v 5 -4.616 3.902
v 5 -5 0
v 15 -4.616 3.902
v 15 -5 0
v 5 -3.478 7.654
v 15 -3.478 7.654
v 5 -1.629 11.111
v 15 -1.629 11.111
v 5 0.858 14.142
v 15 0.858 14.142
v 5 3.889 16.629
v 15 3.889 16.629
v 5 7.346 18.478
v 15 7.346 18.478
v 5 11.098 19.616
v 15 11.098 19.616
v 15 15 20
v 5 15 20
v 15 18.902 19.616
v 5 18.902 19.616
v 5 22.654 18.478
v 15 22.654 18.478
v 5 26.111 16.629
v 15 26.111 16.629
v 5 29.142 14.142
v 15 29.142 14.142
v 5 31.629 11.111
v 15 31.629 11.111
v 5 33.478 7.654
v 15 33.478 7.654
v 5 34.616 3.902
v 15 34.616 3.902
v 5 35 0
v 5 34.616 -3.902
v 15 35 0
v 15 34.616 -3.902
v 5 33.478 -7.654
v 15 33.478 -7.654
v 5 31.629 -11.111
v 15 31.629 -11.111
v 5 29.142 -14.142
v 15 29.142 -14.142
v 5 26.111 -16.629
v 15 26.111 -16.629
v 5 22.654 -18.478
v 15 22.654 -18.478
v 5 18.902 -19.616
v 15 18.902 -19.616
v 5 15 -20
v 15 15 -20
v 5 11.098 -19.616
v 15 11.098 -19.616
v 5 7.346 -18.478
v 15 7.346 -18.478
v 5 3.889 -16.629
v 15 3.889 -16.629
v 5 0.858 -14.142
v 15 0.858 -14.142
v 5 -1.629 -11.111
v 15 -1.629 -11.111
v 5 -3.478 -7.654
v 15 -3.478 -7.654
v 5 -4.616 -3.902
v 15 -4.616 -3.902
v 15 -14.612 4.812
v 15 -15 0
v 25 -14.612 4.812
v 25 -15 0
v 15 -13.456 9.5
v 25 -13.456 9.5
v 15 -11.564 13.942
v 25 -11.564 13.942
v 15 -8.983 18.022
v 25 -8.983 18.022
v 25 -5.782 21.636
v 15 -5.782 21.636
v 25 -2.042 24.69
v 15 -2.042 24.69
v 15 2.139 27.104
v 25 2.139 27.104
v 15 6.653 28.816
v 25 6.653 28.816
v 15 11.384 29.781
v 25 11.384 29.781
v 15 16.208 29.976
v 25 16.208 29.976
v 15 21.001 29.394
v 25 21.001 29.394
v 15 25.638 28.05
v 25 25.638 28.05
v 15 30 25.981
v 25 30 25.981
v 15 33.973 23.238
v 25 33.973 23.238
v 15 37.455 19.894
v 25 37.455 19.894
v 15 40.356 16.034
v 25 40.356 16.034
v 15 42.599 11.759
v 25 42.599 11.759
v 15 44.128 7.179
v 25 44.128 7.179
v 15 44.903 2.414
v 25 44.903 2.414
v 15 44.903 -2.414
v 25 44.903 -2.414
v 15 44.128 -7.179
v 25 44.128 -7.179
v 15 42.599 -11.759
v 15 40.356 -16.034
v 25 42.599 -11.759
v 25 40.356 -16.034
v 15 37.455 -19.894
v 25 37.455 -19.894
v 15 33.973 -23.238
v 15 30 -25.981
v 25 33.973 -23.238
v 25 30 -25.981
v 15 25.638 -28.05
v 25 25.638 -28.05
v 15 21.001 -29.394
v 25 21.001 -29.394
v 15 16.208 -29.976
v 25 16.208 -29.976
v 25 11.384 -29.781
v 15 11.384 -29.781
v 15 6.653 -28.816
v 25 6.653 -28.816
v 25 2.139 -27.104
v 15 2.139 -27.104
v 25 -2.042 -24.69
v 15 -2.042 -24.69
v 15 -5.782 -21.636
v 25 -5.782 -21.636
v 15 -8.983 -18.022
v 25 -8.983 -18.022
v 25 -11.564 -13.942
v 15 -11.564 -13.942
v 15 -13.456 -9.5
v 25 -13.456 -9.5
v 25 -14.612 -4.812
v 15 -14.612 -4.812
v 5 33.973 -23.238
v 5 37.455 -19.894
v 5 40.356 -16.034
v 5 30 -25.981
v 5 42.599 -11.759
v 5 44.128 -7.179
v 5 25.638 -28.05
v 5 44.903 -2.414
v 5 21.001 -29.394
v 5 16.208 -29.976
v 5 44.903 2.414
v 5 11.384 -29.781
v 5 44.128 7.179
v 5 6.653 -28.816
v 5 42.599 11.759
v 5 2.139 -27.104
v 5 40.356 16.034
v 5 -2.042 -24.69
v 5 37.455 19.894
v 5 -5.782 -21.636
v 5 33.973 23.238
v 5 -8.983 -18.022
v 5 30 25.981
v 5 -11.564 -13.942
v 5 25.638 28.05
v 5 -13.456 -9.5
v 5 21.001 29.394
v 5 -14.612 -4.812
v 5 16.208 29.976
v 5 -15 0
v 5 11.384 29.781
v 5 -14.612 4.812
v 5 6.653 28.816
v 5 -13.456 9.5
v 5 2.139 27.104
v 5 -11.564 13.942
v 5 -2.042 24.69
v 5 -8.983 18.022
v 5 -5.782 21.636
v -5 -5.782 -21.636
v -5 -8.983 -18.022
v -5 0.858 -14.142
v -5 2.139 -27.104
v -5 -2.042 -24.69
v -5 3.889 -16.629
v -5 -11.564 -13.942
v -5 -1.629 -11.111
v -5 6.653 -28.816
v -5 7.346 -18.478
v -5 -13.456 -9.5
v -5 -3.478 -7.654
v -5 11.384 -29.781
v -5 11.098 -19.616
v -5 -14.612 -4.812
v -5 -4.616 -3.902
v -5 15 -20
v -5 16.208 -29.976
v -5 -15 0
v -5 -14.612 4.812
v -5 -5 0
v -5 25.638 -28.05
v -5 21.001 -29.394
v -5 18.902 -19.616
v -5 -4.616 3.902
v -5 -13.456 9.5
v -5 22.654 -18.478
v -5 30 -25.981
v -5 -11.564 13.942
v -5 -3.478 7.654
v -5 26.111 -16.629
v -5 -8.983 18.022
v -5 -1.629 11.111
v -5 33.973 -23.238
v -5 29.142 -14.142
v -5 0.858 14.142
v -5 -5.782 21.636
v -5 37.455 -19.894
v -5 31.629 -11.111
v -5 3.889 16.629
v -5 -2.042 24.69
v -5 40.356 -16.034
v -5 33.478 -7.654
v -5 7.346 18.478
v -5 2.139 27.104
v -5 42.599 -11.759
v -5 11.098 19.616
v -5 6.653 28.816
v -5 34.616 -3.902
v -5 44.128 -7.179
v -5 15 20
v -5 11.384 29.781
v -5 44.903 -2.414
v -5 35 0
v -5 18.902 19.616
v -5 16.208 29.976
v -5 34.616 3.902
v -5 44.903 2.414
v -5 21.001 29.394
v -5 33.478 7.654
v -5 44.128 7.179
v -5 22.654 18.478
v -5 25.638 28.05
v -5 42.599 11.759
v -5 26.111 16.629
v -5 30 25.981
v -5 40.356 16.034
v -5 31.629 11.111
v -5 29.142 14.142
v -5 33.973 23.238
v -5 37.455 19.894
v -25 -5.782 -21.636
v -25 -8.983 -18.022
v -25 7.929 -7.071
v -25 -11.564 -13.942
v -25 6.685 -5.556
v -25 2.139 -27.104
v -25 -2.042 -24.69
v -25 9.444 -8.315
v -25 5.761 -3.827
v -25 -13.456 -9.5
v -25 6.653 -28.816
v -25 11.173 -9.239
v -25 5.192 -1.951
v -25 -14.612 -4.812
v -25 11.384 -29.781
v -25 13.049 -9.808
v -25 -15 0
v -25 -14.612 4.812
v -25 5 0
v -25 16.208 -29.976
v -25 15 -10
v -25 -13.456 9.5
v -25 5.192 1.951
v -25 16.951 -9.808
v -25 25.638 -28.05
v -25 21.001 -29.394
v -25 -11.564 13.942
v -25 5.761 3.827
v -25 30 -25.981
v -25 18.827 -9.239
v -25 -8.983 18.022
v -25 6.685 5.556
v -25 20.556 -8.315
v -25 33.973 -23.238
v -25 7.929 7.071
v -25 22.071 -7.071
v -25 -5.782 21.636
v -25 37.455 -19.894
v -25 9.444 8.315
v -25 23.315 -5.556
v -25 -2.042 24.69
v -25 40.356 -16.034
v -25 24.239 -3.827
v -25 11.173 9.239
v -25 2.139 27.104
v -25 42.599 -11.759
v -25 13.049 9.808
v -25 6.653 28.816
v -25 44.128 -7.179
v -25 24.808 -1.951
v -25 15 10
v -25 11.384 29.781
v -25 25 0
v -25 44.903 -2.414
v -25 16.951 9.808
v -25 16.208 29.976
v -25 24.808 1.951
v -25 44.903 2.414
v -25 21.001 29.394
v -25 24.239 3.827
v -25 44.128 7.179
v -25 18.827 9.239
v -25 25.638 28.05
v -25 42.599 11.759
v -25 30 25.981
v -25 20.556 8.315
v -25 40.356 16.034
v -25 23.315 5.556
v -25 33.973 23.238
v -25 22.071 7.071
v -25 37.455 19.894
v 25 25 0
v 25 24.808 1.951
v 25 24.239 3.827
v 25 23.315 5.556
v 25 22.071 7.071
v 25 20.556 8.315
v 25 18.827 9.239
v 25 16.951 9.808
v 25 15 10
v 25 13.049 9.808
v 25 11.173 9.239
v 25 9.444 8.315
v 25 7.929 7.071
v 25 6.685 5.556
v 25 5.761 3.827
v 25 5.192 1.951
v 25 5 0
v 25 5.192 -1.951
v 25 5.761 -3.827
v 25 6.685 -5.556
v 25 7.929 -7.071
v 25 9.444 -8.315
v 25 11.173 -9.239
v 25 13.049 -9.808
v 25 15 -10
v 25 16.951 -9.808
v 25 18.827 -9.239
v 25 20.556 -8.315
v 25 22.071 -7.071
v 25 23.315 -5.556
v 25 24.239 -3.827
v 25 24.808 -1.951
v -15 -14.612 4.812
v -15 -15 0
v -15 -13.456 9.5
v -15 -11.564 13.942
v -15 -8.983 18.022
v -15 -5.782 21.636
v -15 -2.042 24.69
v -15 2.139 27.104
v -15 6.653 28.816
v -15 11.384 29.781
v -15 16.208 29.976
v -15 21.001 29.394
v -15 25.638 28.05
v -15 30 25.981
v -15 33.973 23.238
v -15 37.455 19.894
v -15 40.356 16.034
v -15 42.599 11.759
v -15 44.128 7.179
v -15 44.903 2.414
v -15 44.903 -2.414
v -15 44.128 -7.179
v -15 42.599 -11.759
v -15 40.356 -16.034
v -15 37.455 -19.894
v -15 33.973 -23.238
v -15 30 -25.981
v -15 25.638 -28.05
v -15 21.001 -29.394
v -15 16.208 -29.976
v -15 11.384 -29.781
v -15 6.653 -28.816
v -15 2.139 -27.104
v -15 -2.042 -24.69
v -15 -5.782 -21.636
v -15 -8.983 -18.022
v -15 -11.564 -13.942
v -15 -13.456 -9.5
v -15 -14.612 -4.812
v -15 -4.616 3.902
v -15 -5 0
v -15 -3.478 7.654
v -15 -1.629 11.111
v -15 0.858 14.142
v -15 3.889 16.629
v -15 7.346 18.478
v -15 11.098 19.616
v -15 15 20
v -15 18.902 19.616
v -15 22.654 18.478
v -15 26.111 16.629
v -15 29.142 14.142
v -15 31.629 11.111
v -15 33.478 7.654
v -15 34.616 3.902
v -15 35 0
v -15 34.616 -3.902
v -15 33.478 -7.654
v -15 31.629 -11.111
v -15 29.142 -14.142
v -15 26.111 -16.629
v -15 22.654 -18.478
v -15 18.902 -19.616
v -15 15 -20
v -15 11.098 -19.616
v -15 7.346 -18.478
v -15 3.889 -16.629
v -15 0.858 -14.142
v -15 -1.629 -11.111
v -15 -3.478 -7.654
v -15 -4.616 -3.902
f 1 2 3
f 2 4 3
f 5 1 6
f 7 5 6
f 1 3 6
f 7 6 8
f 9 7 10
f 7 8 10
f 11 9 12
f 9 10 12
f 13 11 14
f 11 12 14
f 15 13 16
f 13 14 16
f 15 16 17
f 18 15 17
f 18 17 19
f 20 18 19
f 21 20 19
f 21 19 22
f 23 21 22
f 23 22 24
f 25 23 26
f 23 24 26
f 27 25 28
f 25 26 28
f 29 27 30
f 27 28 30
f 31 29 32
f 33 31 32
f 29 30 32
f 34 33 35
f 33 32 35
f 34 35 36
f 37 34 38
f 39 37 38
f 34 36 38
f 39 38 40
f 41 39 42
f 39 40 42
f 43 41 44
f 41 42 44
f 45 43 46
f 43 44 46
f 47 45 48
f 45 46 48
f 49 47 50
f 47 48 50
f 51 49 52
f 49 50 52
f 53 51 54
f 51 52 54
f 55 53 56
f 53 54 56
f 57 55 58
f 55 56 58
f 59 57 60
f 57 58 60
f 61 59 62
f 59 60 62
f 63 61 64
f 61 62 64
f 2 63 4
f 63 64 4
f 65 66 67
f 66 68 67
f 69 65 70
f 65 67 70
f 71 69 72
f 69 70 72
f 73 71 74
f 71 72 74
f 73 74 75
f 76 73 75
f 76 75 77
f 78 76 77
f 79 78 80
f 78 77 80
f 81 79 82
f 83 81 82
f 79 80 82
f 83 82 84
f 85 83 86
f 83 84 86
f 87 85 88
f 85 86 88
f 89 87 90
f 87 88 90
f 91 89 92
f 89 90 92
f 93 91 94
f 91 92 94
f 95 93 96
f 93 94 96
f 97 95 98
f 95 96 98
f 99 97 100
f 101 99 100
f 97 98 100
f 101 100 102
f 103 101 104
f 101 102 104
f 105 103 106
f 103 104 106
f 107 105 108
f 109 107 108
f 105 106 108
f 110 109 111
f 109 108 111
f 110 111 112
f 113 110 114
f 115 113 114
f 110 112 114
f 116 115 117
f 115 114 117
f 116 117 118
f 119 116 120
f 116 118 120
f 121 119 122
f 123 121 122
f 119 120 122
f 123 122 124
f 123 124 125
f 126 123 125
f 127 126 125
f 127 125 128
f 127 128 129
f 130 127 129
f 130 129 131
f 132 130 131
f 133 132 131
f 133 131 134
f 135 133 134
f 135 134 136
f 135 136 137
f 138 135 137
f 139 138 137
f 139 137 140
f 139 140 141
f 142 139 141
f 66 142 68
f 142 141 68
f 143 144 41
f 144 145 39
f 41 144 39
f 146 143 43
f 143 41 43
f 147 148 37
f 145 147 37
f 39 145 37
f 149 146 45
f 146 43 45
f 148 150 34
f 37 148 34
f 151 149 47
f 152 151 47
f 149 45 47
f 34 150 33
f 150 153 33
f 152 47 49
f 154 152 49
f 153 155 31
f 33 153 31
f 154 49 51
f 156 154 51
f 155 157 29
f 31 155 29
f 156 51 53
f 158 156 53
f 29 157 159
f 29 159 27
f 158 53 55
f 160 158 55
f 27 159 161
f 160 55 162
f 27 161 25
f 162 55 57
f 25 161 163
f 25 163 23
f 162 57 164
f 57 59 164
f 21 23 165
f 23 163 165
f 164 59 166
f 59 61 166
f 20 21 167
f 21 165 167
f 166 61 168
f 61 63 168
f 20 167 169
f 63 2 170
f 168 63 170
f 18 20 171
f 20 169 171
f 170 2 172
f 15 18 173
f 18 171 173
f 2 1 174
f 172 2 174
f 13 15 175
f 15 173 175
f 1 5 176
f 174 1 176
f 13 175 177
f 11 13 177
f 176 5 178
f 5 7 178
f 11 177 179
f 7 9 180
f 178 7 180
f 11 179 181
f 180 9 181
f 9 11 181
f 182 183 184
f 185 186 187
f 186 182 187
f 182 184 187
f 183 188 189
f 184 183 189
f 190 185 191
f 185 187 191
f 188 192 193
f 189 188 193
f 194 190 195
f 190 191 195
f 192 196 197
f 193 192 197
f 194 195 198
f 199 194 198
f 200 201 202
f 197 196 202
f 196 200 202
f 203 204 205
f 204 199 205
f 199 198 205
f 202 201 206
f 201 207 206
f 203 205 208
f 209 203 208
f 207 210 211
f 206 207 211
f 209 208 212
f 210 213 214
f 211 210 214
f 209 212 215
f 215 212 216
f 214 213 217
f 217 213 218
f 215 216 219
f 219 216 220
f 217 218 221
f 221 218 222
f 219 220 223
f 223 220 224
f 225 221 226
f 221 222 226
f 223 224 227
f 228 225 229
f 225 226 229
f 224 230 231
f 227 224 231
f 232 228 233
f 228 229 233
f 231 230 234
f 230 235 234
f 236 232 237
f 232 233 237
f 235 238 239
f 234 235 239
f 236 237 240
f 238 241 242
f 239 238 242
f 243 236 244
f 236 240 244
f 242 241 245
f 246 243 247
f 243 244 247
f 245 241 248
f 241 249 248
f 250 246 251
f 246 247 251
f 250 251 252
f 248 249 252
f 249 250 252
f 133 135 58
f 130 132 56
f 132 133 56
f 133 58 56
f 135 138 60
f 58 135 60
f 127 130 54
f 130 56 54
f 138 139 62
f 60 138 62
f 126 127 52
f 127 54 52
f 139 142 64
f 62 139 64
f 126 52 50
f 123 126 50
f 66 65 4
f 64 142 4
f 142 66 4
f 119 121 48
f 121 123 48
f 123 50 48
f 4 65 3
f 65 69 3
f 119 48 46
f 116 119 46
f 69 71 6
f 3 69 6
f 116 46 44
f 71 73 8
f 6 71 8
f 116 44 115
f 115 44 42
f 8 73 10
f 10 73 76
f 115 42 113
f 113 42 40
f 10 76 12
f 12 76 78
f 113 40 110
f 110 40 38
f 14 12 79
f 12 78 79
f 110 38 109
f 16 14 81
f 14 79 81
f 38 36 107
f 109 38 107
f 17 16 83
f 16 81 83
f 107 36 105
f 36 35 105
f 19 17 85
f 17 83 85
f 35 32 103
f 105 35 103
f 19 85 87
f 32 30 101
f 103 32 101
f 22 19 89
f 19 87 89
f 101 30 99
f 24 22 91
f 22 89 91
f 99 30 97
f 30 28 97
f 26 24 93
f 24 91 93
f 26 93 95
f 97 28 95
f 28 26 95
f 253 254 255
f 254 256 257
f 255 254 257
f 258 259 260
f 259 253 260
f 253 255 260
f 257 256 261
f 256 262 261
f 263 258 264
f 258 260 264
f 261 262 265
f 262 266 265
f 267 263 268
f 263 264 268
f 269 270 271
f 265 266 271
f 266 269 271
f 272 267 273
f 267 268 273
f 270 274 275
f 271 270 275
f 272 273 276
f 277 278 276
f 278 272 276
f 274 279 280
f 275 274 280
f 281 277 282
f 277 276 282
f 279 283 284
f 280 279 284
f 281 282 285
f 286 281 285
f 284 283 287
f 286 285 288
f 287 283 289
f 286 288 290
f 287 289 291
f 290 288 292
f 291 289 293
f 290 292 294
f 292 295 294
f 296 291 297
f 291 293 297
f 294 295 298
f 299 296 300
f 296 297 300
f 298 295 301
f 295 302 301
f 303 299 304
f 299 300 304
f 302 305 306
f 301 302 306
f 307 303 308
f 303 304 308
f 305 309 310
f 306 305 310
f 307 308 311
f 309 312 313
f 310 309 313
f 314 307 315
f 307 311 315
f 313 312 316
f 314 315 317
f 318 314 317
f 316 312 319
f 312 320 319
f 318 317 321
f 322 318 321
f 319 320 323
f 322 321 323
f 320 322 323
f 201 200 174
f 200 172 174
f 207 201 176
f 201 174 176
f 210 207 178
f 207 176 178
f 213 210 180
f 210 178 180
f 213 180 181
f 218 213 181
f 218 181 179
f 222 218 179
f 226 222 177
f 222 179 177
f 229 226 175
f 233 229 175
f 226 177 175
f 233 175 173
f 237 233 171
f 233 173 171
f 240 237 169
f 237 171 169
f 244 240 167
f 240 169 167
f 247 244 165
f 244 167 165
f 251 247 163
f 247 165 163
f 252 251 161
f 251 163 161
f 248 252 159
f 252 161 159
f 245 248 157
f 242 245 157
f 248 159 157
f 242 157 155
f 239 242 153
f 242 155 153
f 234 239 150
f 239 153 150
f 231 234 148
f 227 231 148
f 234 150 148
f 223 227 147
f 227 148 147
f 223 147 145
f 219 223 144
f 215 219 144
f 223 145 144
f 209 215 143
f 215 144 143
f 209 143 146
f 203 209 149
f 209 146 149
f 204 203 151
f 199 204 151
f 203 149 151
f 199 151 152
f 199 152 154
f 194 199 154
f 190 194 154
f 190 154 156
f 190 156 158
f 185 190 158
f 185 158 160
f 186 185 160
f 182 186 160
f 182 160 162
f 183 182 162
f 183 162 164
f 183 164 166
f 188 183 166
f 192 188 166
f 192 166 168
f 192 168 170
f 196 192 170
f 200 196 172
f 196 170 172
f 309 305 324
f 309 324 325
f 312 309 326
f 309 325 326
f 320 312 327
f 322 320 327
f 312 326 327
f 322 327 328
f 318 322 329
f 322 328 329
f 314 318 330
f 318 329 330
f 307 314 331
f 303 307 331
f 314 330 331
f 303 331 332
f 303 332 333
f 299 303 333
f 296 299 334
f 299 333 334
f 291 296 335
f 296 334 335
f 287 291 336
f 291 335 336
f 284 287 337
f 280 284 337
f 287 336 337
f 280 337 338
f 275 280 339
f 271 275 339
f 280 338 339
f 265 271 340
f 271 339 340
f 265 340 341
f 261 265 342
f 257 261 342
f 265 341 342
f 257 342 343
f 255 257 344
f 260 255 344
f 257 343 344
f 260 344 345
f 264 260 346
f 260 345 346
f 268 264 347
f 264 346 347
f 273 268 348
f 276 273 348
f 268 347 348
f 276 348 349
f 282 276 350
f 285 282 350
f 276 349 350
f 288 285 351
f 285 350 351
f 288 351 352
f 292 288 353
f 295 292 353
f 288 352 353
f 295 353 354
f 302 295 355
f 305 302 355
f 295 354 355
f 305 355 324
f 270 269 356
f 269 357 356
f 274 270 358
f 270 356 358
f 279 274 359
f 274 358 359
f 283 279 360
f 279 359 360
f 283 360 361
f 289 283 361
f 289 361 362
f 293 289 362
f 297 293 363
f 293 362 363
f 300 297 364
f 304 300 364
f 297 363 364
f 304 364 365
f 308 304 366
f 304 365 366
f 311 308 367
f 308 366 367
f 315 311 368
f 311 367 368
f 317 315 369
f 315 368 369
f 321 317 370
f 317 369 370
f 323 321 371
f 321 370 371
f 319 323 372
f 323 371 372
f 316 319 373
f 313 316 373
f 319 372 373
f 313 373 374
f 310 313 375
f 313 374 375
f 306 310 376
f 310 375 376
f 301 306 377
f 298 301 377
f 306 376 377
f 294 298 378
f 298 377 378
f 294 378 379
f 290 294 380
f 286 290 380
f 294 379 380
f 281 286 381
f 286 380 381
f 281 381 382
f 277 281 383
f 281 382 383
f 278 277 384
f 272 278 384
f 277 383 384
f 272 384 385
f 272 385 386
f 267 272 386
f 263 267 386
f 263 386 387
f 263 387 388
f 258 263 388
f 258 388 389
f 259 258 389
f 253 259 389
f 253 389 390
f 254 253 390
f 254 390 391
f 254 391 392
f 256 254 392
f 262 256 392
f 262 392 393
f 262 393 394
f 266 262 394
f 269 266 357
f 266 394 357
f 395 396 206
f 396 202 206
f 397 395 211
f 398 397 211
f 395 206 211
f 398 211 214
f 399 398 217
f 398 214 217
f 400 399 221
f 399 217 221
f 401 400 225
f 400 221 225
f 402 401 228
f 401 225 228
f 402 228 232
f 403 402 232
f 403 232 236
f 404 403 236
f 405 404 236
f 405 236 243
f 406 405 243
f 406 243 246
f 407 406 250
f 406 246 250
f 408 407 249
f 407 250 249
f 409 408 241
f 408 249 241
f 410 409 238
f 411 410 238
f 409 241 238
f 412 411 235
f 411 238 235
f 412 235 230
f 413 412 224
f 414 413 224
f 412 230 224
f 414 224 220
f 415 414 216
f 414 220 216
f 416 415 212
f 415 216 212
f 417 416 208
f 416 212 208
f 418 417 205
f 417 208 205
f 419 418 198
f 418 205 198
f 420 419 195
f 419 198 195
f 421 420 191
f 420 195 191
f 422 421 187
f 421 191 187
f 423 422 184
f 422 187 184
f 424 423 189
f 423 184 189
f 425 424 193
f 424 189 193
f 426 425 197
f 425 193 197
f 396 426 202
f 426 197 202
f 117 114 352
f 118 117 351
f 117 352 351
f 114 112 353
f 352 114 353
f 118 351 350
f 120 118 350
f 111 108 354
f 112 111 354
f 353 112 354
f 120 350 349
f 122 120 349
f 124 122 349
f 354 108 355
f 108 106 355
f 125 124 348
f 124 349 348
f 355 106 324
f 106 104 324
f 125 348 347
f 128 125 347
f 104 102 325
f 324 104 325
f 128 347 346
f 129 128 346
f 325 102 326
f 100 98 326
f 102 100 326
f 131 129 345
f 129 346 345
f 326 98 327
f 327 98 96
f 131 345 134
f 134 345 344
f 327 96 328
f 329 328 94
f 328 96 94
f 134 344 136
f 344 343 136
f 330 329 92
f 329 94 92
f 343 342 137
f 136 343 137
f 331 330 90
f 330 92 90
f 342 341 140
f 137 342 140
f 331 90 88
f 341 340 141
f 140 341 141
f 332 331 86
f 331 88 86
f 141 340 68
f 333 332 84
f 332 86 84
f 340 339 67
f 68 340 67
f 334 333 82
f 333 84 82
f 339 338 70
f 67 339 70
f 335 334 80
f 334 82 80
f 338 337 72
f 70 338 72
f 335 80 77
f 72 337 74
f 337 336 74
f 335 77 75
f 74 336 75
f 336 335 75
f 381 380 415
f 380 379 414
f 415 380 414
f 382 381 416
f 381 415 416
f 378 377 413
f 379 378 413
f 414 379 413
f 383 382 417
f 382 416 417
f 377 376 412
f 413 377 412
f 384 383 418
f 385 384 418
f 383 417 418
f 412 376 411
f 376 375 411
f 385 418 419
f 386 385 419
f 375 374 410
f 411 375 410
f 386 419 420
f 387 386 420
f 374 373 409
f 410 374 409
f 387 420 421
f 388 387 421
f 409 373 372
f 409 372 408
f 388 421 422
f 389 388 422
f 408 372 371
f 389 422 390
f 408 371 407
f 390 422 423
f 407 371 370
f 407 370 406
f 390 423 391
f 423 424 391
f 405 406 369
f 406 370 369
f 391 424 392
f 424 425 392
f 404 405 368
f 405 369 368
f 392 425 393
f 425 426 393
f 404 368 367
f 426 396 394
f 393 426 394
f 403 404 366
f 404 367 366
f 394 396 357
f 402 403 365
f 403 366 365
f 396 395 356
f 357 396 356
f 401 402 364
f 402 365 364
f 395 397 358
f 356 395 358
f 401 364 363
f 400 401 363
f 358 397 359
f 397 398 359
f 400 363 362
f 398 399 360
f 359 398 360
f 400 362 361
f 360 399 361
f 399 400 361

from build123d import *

# Parameters (mm, degrees)
F2_R     = 10
F3_DEPTH = 50


with BuildPart() as f1:
    # F0 (on Top) → F1 (revolve)
    with BuildSketch(Plane.XY):
        Polygon((15, -15), (25, -15), (25, 15), (-25, 15), (-25, -15), (-15, -15), (-15, -5), (-5, -5), (-5, -15), (5, -15), (5, -5), (15, -5), align=None)
    revolve(axis=Axis((0, 15, 0), (-1, 0, 0)))

    # F2 (on face) → F3 (cut)
    with BuildSketch(Plane.YZ.offset(25)):
        with Locations((15, 0)):
            Circle(F2_R)
    extrude(amount=-F3_DEPTH, mode=Mode.SUBTRACT)


solid = f1.part
